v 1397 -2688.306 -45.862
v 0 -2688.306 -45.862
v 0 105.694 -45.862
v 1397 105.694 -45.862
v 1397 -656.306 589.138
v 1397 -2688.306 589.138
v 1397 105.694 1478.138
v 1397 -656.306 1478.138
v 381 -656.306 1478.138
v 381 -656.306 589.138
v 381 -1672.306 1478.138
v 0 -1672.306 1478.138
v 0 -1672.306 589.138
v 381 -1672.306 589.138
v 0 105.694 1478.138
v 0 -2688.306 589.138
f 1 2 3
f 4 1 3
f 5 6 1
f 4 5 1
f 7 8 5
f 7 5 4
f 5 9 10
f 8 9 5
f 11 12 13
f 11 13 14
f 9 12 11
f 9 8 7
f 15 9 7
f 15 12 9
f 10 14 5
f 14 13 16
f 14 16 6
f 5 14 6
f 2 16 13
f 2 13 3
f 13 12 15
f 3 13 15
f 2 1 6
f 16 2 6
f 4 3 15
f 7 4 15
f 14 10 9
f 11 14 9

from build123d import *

# Parameters (mm, degrees)
F1_W     = 2794
F1_H     = 1524
F2_DEPTH = 1397
F3_W     = 381
F3_H     = 889
F4_DEPTH = 1016
F5_W     = 1016
F5_H     = 889
F6_DEPTH = 2.54
F7_W     = 1016
F7_H     = 889
F8_DEPTH = 2032


with BuildPart() as f2:
    # F1 (on face) → F2 (new body)
    with BuildSketch(Plane.YZ):
        with Locations((-1291.305676, 716.138394)):
            Rectangle(F1_W, F1_H)
    extrude(amount=F2_DEPTH)

    # F3 (on face) → F4 (cut)
    with BuildSketch(Plane.XZ.offset(2688.305676)):
        with Locations((190.5, 1033.638394)):
            Rectangle(F3_W, F3_H)
    extrude(amount=-F4_DEPTH, mode=Mode.SUBTRACT)

    # F5 (on face) → F6 (cut)
    with BuildSketch(Plane.XZ.offset(2688.305676)):
        with Locations((889, 1033.638394)):
            Rectangle(F5_W, F5_H)
    extrude(amount=F6_DEPTH, mode=Mode.SUBTRACT)

    # F7 (on face) → F8 (cut)
    with BuildSketch(Plane.XZ.offset(2688.305676)):
        with Locations((889, 1033.638394)):
            Rectangle(F7_W, F7_H)
    extrude(amount=-F8_DEPTH, mode=Mode.SUBTRACT)


solid = f2.part
